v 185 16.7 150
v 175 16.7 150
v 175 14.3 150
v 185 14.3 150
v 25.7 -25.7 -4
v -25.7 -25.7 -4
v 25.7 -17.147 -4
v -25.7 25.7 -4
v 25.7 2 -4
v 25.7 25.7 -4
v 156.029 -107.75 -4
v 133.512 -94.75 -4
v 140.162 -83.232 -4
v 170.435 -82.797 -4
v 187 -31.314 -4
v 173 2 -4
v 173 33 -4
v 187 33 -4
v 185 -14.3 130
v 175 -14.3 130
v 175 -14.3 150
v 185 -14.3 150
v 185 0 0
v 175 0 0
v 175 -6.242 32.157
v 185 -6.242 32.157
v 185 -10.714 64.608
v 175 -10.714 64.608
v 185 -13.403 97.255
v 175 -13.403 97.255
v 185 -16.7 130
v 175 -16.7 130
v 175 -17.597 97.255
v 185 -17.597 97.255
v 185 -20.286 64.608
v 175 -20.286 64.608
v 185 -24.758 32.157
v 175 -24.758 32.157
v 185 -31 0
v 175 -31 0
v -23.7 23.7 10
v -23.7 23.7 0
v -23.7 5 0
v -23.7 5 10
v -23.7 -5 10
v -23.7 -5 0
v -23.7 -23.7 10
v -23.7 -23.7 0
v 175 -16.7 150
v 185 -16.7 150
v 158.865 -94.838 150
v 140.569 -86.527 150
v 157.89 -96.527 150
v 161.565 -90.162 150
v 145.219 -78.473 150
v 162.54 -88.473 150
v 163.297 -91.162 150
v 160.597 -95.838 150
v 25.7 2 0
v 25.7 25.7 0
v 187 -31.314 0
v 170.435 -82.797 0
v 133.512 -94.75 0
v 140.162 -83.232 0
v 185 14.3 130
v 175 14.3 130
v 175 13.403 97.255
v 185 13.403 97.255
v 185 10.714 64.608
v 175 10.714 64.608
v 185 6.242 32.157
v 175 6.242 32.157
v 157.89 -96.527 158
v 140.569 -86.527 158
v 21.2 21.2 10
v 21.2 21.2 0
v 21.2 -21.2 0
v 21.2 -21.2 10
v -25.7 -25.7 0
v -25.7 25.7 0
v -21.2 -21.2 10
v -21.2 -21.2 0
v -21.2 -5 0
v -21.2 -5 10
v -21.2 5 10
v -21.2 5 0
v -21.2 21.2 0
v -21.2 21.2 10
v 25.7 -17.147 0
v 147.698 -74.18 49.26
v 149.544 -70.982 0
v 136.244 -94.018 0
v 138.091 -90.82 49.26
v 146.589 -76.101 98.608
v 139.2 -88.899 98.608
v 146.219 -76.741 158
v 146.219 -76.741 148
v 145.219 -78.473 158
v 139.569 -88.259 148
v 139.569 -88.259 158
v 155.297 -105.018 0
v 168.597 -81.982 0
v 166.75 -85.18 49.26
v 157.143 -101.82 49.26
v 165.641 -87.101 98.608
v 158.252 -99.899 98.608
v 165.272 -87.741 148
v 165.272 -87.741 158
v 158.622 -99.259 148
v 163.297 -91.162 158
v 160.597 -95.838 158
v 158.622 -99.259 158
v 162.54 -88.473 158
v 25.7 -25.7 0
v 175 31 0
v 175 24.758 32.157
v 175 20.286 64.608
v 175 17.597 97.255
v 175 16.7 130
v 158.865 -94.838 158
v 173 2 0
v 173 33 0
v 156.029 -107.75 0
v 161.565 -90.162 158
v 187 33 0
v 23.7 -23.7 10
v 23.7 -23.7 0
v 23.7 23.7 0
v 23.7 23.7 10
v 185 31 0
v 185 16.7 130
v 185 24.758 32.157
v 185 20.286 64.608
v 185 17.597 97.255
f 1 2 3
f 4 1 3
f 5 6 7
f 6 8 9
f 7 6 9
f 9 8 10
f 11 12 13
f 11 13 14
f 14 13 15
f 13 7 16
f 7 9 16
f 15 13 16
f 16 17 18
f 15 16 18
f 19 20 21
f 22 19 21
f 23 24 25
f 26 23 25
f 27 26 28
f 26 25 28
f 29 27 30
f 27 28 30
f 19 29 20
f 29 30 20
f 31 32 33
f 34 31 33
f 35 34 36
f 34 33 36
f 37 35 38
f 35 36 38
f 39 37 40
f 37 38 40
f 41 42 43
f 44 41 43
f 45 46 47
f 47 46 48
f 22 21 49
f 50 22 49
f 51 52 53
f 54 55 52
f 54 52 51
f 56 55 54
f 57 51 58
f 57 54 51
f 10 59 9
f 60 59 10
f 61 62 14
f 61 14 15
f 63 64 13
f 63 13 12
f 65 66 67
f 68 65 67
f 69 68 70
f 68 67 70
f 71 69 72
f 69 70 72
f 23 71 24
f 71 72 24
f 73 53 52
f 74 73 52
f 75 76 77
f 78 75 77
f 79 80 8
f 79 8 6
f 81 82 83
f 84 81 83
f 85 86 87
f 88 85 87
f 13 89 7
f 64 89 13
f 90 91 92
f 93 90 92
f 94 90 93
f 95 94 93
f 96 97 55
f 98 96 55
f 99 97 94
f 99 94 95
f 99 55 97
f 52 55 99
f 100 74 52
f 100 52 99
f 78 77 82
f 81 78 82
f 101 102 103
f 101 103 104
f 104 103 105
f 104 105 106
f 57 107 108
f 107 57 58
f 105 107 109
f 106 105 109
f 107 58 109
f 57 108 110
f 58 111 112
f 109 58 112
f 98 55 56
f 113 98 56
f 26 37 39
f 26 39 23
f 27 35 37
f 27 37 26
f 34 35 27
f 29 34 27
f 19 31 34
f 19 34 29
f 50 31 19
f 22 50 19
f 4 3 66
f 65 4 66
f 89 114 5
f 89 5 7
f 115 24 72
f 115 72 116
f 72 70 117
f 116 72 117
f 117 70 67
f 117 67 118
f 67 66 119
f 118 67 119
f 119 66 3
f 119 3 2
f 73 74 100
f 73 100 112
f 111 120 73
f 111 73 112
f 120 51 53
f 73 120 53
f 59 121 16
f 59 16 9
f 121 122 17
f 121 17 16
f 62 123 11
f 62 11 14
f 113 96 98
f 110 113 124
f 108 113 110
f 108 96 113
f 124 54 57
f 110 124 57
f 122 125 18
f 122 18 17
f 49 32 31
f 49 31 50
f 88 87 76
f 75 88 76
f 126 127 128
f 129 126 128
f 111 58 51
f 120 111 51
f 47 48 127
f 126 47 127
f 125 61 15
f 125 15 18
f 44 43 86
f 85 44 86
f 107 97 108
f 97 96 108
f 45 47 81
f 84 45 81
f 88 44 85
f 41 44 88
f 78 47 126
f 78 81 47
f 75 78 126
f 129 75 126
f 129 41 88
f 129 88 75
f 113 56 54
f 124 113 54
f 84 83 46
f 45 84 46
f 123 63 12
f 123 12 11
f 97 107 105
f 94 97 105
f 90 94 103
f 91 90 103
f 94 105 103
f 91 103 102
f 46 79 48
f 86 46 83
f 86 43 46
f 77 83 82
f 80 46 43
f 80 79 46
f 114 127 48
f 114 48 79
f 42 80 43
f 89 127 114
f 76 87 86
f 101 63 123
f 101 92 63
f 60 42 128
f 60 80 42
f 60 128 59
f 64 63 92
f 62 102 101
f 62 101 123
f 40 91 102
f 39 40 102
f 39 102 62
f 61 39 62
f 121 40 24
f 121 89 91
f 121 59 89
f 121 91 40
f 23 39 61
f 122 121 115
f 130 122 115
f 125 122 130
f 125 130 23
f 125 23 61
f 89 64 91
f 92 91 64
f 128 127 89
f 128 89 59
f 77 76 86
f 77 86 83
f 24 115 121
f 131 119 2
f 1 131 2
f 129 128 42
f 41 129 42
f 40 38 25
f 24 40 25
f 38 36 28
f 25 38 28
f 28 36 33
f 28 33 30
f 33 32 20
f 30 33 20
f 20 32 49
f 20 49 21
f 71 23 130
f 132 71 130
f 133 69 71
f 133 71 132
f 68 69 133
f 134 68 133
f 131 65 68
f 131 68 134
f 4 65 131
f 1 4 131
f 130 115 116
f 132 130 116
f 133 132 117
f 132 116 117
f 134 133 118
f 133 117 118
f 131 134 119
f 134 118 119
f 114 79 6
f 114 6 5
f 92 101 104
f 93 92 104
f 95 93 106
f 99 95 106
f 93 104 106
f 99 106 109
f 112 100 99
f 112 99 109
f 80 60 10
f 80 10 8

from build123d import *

# Parameters (mm, degrees)
F1_DEPTH  = 10
F5_DEPTH  = 10
F4_W      = 1.2
F4_H      = 20
F12_DEPTH = 8
F13_W     = 22
F13_H     = 13.3
F14_DEPTH = 2
F17_DEPTH = 22
F19_ANGLE = -30
F21_DEPTH = 4


# Not quite as in the source:
# - the program builds the solid bodies; features that only make, move or delete a surface that nothing else refers to are left out


with BuildPart() as f1:
    # F0 (on Top) → F1 (new body)
    with BuildSketch(Plane.XY):
        Polygon((-21.2, 21.2), (21.2, 21.2), (21.2, -21.2), (-21.2, -21.2), (-21.2, -5), (-23.7, -5), (-23.7, -23.7), (23.7, -23.7), (23.7, 23.7), (-23.7, 23.7), (-23.7, 5), (-21.2, 5), align=None)
    extrude(amount=F1_DEPTH)



with BuildPart() as f5:
    # F4 (on line) → F5 (new body)
    with BuildSketch(Plane.YZ.offset(175)):
        with BuildLine():
            Line((15.5, 130), (15.5, 0))
            Line((15.5, 0), (31, 0))
            ThreePointArc((31, 0), (20.2857494387, 64.6079324383), (16.7, 130))
            Line((16.7, 130), (16.7, 150))
            Line((16.7, 150), (15.5, 150))
            Line((15.5, 150), (15.5, 130))
        make_face()
        with BuildLine():
            ThreePointArc((14.3, 130), (10.7142505613, 64.6079324383), (0, 0))
            Line((0, 0), (15.5, 0))
            Line((15.5, 0), (15.5, 130))
            Line((15.5, 130), (15.5, 150))
            Line((15.5, 150), (14.3, 150))
            Line((14.3, 150), (14.3, 130))
        make_face()
    extrude(amount=F5_DEPTH)

    # F4 (on line) → F5, piece 2 (join)
    with BuildSketch(Plane.YZ.offset(175)):
        with BuildLine():
            Line((-15.5, 0), (0, 0))
            ThreePointArc((0, 0), (-10.7142505613, 64.6079324383), (-14.3, 130))
            Line((-14.3, 130), (-15.5, 130))
            Line((-15.5, 130), (-15.5, 0))
        make_face()
        with BuildLine():
            Line((-31, 0), (-15.5, 0))
            Line((-15.5, 0), (-15.5, 130))
            Line((-15.5, 130), (-16.7, 130))
            ThreePointArc((-16.7, 130), (-20.2857494387, 64.6079324383), (-31, 0))
        make_face()
        with Locations((-14.9, 140)):
            Rectangle(F4_W, F4_H)
        with Locations((-16.1, 140)):
            Rectangle(F4_W, F4_H)
    extrude(amount=F5_DEPTH)


with BuildPart() as f12:
    # F11 (on line) → F12 (new body)
    with BuildSketch(Plane.XY.offset(150)):
        Polygon((141.5544456623, -82.85), (161.5544456623, -82.85), (161.5544456623, -84.8), (163.5544456623, -84.8), (163.5544456623, -80.85), (141.5544456623, -80.85), align=None)
    extrude(amount=F12_DEPTH)



with BuildPart() as f12b:
    # F11 (on line) → F12, piece 2 (new body)
    with BuildSketch(Plane.XY.offset(150)):
        Polygon((161.5544456623, -92.15), (141.5544456623, -92.15), (141.5544456623, -94.15), (163.5544456623, -94.15), (163.5544456623, -90.2), (161.5544456623, -90.2), align=None)
    extrude(amount=F12_DEPTH)


with BuildPart() as f12_1:
    add(f12.part)

    add(f12b.part)  # F14 merges F12b
    # F13 (on line) → F14 (join)
    with BuildSketch(Plane.XY.offset(150)):
        with Locations((152.5544456623, -87.5)):
            Rectangle(F13_W, F13_H)
    extrude(amount=-F14_DEPTH)

    # F16 (on face) → F17 (join)
    with BuildSketch(Plane(origin=(163.5544456623, 0, 0), x_dir=(0, -1, 0), z_dir=(-1, 0, 0))):
        with BuildLine():
            Line((87.5, 0), (87.5, 148))
            Line((87.5, 148), (80.85, 148))
            ThreePointArc((80.85, 148), (79.1866617309, 73.9253374966), (74.2, 0))
            Line((74.2, 0), (87.5, 0))
        make_face()
        with BuildLine():
            Line((94.15, 148), (87.5, 148))
            Line((87.5, 148), (87.5, 0))
            Line((87.5, 0), (100.8, 0))
            ThreePointArc((100.8, 0), (95.8133382691, 73.9253374966), (94.15, 148))
        make_face()
    extrude(amount=F17_DEPTH)

    # F18: union 


with BuildPart() as f12_2:
    # F19: moved
    add(f12_1.part.rotate(Axis((151.5544456623, -87.5, 75), (0, 0, 1)), F19_ANGLE))


with BuildPart() as f1_1:
    add(f1.part)

    add(f5.part)  # F21 merges F5

    add(f12_2.part)  # F21 merges F12
    # F20 (on Top) → F21 (join)
    with BuildSketch(Plane.XY):
        Polygon((-25.7, 25.7), (-25.7, -25.7), (25.7, -25.7), (25.7, -17.1473029949), (140.1621408169, -83.2320508076), (133.5121408169, -94.7501886779), (156.0288013153, -107.7501886779), (170.4353579421, -82.7973006382), (187, -31.313824878), (187, 0), (187, 33), (173, 33), (173, 2), (25.7, 2), (25.7, 25.7), align=None)
        Polygon((23.7, 0), (175, 0), (175, 31), (185, 31), (185, 0), (185, -31), (168.5967505077, -81.9818621297), (155.2967505077, -105.0181378703), (136.2441916244, -94.0181378703), (142.8941916244, -82.5), (23.7, -13.6832013798), (23.7, -23.7), (-23.7, -23.7), (-23.7, 23.7), (23.7, 23.7), align=None, mode=Mode.SUBTRACT)
        Polygon((175, 31), (175, 0), (23.7, 0), (23.7, 23.7), (-23.7, 23.7), (-23.7, -23.7), (23.7, -23.7), (23.7, -13.6832013798), (142.8941916244, -82.5), (136.2441916244, -94.0181378703), (155.2967505077, -105.0181378703), (168.5967505077, -81.9818621297), (185, -31), (185, 0), (185, 31), align=None)
    extrude(amount=-F21_DEPTH)


solid = f1_1.part
